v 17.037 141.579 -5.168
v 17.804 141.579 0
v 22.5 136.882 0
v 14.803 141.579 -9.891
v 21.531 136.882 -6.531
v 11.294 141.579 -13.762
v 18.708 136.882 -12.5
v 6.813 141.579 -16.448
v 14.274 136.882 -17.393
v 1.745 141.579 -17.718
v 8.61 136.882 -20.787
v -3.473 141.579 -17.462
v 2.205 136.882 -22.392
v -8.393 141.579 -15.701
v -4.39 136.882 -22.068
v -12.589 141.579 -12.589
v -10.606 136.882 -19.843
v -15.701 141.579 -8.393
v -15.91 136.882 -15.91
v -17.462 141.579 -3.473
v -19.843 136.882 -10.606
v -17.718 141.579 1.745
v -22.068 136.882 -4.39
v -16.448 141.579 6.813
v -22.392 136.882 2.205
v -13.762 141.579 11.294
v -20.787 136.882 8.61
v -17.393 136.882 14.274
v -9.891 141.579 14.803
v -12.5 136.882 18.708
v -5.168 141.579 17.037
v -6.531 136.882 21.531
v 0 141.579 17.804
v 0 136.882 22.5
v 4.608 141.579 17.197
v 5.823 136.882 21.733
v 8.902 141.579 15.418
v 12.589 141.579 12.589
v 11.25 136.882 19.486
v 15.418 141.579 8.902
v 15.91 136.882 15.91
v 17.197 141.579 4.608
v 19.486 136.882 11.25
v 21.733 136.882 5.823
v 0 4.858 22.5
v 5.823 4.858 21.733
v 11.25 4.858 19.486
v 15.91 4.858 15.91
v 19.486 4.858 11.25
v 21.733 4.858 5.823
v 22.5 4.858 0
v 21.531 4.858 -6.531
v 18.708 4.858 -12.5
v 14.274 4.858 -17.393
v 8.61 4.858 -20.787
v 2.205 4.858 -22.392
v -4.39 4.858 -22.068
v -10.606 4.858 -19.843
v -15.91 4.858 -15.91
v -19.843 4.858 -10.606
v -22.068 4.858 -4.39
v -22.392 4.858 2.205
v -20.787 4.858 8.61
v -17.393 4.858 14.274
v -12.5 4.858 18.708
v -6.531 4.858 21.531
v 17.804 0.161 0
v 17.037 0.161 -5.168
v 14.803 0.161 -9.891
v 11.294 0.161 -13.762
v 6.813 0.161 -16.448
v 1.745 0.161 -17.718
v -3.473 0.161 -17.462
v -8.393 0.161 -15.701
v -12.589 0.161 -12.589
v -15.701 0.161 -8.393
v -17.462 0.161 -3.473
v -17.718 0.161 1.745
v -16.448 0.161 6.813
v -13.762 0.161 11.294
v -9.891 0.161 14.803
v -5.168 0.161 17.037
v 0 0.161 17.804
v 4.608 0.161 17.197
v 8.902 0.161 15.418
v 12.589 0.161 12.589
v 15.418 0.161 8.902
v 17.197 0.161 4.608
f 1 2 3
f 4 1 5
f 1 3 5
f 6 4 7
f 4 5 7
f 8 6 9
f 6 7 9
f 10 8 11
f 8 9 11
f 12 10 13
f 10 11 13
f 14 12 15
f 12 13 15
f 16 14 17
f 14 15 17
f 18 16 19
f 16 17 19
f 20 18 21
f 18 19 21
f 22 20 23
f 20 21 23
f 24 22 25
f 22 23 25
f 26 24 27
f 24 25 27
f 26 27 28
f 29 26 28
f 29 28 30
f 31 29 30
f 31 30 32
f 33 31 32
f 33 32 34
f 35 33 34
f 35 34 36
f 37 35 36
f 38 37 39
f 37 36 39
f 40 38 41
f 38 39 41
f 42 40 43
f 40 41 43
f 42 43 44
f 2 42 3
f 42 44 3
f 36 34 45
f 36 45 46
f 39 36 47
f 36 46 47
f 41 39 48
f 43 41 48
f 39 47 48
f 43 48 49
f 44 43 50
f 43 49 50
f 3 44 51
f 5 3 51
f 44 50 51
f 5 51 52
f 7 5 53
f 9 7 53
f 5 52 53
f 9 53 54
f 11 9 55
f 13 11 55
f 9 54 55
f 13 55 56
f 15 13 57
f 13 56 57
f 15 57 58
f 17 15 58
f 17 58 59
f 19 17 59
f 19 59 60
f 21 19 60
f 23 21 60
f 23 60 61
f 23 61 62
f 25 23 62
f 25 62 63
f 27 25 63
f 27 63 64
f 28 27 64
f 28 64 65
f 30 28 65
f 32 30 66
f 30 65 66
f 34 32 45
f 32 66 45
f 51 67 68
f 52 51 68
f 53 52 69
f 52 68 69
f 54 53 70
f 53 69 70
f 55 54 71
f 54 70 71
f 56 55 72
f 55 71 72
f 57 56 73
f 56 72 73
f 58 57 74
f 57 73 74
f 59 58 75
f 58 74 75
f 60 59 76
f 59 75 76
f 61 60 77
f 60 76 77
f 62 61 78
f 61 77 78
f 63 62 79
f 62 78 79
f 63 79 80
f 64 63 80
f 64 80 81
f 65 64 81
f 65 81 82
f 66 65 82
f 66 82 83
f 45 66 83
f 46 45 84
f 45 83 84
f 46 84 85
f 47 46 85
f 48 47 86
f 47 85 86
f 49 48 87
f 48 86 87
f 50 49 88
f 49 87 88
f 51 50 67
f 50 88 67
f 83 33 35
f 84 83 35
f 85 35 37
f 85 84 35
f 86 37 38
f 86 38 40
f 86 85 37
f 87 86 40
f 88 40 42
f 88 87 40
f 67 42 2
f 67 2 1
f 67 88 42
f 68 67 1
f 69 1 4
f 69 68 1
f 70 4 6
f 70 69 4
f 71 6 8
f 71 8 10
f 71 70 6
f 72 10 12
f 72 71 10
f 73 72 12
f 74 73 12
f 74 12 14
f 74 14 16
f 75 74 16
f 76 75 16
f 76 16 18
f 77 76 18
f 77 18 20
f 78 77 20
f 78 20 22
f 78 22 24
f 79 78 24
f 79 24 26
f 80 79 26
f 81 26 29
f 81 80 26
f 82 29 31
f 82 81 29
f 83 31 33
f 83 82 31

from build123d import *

# Parameters (mm, degrees)
SKETCH1_R           = 22.5
BOSS_EXTRUDE1_DEPTH = 141.739806
SKETCH2_R           = 17.803613723
CUT_EXTRUDE1_DEPTH  = 146.267589658


with BuildPart() as part:
    # Sketch1 → Boss-Extrude1 (new body)
    with BuildSketch(Plane(origin=(0, 0, 0), x_dir=(1, 0, 0), z_dir=(0, 1, 0))):
        with Locations(Location((0, 0, 0), (0, 0, 270))):
            Circle(SKETCH1_R)
    extrude(amount=BOSS_EXTRUDE1_DEPTH)

    # Sketch2 → Cut-Extrude1 (cut, through all)
    with BuildSketch(Plane(origin=(0, 0, 0), x_dir=(1, 0, 0), z_dir=(0, 1, 0))):
        with Locations(Location((0, 0, 0), (0, 0, 270))):
            Circle(SKETCH2_R)
    extrude(amount=CUT_EXTRUDE1_DEPTH, mode=Mode.SUBTRACT)

    # Chamfer1: read off the stored shape, not the designer's step
    # Chamfer1 outline → Chamfer1 (revolve, cut)
    with BuildSketch(Plane.XY):
        Polygon((22.5, 136.88216168), (22.5, 141.73980616), (17.803613723, 141.73980616), (17.803613723, 141.578547956), align=None)
        Polygon((22.5, 4.857644481), (17.803613723, 0.161258204), (17.803613723, 0), (22.5, 0), align=None)
    revolve(axis=Axis((0, 0, 0), (0, 1, 0)), mode=Mode.SUBTRACT)


solid = part.part
